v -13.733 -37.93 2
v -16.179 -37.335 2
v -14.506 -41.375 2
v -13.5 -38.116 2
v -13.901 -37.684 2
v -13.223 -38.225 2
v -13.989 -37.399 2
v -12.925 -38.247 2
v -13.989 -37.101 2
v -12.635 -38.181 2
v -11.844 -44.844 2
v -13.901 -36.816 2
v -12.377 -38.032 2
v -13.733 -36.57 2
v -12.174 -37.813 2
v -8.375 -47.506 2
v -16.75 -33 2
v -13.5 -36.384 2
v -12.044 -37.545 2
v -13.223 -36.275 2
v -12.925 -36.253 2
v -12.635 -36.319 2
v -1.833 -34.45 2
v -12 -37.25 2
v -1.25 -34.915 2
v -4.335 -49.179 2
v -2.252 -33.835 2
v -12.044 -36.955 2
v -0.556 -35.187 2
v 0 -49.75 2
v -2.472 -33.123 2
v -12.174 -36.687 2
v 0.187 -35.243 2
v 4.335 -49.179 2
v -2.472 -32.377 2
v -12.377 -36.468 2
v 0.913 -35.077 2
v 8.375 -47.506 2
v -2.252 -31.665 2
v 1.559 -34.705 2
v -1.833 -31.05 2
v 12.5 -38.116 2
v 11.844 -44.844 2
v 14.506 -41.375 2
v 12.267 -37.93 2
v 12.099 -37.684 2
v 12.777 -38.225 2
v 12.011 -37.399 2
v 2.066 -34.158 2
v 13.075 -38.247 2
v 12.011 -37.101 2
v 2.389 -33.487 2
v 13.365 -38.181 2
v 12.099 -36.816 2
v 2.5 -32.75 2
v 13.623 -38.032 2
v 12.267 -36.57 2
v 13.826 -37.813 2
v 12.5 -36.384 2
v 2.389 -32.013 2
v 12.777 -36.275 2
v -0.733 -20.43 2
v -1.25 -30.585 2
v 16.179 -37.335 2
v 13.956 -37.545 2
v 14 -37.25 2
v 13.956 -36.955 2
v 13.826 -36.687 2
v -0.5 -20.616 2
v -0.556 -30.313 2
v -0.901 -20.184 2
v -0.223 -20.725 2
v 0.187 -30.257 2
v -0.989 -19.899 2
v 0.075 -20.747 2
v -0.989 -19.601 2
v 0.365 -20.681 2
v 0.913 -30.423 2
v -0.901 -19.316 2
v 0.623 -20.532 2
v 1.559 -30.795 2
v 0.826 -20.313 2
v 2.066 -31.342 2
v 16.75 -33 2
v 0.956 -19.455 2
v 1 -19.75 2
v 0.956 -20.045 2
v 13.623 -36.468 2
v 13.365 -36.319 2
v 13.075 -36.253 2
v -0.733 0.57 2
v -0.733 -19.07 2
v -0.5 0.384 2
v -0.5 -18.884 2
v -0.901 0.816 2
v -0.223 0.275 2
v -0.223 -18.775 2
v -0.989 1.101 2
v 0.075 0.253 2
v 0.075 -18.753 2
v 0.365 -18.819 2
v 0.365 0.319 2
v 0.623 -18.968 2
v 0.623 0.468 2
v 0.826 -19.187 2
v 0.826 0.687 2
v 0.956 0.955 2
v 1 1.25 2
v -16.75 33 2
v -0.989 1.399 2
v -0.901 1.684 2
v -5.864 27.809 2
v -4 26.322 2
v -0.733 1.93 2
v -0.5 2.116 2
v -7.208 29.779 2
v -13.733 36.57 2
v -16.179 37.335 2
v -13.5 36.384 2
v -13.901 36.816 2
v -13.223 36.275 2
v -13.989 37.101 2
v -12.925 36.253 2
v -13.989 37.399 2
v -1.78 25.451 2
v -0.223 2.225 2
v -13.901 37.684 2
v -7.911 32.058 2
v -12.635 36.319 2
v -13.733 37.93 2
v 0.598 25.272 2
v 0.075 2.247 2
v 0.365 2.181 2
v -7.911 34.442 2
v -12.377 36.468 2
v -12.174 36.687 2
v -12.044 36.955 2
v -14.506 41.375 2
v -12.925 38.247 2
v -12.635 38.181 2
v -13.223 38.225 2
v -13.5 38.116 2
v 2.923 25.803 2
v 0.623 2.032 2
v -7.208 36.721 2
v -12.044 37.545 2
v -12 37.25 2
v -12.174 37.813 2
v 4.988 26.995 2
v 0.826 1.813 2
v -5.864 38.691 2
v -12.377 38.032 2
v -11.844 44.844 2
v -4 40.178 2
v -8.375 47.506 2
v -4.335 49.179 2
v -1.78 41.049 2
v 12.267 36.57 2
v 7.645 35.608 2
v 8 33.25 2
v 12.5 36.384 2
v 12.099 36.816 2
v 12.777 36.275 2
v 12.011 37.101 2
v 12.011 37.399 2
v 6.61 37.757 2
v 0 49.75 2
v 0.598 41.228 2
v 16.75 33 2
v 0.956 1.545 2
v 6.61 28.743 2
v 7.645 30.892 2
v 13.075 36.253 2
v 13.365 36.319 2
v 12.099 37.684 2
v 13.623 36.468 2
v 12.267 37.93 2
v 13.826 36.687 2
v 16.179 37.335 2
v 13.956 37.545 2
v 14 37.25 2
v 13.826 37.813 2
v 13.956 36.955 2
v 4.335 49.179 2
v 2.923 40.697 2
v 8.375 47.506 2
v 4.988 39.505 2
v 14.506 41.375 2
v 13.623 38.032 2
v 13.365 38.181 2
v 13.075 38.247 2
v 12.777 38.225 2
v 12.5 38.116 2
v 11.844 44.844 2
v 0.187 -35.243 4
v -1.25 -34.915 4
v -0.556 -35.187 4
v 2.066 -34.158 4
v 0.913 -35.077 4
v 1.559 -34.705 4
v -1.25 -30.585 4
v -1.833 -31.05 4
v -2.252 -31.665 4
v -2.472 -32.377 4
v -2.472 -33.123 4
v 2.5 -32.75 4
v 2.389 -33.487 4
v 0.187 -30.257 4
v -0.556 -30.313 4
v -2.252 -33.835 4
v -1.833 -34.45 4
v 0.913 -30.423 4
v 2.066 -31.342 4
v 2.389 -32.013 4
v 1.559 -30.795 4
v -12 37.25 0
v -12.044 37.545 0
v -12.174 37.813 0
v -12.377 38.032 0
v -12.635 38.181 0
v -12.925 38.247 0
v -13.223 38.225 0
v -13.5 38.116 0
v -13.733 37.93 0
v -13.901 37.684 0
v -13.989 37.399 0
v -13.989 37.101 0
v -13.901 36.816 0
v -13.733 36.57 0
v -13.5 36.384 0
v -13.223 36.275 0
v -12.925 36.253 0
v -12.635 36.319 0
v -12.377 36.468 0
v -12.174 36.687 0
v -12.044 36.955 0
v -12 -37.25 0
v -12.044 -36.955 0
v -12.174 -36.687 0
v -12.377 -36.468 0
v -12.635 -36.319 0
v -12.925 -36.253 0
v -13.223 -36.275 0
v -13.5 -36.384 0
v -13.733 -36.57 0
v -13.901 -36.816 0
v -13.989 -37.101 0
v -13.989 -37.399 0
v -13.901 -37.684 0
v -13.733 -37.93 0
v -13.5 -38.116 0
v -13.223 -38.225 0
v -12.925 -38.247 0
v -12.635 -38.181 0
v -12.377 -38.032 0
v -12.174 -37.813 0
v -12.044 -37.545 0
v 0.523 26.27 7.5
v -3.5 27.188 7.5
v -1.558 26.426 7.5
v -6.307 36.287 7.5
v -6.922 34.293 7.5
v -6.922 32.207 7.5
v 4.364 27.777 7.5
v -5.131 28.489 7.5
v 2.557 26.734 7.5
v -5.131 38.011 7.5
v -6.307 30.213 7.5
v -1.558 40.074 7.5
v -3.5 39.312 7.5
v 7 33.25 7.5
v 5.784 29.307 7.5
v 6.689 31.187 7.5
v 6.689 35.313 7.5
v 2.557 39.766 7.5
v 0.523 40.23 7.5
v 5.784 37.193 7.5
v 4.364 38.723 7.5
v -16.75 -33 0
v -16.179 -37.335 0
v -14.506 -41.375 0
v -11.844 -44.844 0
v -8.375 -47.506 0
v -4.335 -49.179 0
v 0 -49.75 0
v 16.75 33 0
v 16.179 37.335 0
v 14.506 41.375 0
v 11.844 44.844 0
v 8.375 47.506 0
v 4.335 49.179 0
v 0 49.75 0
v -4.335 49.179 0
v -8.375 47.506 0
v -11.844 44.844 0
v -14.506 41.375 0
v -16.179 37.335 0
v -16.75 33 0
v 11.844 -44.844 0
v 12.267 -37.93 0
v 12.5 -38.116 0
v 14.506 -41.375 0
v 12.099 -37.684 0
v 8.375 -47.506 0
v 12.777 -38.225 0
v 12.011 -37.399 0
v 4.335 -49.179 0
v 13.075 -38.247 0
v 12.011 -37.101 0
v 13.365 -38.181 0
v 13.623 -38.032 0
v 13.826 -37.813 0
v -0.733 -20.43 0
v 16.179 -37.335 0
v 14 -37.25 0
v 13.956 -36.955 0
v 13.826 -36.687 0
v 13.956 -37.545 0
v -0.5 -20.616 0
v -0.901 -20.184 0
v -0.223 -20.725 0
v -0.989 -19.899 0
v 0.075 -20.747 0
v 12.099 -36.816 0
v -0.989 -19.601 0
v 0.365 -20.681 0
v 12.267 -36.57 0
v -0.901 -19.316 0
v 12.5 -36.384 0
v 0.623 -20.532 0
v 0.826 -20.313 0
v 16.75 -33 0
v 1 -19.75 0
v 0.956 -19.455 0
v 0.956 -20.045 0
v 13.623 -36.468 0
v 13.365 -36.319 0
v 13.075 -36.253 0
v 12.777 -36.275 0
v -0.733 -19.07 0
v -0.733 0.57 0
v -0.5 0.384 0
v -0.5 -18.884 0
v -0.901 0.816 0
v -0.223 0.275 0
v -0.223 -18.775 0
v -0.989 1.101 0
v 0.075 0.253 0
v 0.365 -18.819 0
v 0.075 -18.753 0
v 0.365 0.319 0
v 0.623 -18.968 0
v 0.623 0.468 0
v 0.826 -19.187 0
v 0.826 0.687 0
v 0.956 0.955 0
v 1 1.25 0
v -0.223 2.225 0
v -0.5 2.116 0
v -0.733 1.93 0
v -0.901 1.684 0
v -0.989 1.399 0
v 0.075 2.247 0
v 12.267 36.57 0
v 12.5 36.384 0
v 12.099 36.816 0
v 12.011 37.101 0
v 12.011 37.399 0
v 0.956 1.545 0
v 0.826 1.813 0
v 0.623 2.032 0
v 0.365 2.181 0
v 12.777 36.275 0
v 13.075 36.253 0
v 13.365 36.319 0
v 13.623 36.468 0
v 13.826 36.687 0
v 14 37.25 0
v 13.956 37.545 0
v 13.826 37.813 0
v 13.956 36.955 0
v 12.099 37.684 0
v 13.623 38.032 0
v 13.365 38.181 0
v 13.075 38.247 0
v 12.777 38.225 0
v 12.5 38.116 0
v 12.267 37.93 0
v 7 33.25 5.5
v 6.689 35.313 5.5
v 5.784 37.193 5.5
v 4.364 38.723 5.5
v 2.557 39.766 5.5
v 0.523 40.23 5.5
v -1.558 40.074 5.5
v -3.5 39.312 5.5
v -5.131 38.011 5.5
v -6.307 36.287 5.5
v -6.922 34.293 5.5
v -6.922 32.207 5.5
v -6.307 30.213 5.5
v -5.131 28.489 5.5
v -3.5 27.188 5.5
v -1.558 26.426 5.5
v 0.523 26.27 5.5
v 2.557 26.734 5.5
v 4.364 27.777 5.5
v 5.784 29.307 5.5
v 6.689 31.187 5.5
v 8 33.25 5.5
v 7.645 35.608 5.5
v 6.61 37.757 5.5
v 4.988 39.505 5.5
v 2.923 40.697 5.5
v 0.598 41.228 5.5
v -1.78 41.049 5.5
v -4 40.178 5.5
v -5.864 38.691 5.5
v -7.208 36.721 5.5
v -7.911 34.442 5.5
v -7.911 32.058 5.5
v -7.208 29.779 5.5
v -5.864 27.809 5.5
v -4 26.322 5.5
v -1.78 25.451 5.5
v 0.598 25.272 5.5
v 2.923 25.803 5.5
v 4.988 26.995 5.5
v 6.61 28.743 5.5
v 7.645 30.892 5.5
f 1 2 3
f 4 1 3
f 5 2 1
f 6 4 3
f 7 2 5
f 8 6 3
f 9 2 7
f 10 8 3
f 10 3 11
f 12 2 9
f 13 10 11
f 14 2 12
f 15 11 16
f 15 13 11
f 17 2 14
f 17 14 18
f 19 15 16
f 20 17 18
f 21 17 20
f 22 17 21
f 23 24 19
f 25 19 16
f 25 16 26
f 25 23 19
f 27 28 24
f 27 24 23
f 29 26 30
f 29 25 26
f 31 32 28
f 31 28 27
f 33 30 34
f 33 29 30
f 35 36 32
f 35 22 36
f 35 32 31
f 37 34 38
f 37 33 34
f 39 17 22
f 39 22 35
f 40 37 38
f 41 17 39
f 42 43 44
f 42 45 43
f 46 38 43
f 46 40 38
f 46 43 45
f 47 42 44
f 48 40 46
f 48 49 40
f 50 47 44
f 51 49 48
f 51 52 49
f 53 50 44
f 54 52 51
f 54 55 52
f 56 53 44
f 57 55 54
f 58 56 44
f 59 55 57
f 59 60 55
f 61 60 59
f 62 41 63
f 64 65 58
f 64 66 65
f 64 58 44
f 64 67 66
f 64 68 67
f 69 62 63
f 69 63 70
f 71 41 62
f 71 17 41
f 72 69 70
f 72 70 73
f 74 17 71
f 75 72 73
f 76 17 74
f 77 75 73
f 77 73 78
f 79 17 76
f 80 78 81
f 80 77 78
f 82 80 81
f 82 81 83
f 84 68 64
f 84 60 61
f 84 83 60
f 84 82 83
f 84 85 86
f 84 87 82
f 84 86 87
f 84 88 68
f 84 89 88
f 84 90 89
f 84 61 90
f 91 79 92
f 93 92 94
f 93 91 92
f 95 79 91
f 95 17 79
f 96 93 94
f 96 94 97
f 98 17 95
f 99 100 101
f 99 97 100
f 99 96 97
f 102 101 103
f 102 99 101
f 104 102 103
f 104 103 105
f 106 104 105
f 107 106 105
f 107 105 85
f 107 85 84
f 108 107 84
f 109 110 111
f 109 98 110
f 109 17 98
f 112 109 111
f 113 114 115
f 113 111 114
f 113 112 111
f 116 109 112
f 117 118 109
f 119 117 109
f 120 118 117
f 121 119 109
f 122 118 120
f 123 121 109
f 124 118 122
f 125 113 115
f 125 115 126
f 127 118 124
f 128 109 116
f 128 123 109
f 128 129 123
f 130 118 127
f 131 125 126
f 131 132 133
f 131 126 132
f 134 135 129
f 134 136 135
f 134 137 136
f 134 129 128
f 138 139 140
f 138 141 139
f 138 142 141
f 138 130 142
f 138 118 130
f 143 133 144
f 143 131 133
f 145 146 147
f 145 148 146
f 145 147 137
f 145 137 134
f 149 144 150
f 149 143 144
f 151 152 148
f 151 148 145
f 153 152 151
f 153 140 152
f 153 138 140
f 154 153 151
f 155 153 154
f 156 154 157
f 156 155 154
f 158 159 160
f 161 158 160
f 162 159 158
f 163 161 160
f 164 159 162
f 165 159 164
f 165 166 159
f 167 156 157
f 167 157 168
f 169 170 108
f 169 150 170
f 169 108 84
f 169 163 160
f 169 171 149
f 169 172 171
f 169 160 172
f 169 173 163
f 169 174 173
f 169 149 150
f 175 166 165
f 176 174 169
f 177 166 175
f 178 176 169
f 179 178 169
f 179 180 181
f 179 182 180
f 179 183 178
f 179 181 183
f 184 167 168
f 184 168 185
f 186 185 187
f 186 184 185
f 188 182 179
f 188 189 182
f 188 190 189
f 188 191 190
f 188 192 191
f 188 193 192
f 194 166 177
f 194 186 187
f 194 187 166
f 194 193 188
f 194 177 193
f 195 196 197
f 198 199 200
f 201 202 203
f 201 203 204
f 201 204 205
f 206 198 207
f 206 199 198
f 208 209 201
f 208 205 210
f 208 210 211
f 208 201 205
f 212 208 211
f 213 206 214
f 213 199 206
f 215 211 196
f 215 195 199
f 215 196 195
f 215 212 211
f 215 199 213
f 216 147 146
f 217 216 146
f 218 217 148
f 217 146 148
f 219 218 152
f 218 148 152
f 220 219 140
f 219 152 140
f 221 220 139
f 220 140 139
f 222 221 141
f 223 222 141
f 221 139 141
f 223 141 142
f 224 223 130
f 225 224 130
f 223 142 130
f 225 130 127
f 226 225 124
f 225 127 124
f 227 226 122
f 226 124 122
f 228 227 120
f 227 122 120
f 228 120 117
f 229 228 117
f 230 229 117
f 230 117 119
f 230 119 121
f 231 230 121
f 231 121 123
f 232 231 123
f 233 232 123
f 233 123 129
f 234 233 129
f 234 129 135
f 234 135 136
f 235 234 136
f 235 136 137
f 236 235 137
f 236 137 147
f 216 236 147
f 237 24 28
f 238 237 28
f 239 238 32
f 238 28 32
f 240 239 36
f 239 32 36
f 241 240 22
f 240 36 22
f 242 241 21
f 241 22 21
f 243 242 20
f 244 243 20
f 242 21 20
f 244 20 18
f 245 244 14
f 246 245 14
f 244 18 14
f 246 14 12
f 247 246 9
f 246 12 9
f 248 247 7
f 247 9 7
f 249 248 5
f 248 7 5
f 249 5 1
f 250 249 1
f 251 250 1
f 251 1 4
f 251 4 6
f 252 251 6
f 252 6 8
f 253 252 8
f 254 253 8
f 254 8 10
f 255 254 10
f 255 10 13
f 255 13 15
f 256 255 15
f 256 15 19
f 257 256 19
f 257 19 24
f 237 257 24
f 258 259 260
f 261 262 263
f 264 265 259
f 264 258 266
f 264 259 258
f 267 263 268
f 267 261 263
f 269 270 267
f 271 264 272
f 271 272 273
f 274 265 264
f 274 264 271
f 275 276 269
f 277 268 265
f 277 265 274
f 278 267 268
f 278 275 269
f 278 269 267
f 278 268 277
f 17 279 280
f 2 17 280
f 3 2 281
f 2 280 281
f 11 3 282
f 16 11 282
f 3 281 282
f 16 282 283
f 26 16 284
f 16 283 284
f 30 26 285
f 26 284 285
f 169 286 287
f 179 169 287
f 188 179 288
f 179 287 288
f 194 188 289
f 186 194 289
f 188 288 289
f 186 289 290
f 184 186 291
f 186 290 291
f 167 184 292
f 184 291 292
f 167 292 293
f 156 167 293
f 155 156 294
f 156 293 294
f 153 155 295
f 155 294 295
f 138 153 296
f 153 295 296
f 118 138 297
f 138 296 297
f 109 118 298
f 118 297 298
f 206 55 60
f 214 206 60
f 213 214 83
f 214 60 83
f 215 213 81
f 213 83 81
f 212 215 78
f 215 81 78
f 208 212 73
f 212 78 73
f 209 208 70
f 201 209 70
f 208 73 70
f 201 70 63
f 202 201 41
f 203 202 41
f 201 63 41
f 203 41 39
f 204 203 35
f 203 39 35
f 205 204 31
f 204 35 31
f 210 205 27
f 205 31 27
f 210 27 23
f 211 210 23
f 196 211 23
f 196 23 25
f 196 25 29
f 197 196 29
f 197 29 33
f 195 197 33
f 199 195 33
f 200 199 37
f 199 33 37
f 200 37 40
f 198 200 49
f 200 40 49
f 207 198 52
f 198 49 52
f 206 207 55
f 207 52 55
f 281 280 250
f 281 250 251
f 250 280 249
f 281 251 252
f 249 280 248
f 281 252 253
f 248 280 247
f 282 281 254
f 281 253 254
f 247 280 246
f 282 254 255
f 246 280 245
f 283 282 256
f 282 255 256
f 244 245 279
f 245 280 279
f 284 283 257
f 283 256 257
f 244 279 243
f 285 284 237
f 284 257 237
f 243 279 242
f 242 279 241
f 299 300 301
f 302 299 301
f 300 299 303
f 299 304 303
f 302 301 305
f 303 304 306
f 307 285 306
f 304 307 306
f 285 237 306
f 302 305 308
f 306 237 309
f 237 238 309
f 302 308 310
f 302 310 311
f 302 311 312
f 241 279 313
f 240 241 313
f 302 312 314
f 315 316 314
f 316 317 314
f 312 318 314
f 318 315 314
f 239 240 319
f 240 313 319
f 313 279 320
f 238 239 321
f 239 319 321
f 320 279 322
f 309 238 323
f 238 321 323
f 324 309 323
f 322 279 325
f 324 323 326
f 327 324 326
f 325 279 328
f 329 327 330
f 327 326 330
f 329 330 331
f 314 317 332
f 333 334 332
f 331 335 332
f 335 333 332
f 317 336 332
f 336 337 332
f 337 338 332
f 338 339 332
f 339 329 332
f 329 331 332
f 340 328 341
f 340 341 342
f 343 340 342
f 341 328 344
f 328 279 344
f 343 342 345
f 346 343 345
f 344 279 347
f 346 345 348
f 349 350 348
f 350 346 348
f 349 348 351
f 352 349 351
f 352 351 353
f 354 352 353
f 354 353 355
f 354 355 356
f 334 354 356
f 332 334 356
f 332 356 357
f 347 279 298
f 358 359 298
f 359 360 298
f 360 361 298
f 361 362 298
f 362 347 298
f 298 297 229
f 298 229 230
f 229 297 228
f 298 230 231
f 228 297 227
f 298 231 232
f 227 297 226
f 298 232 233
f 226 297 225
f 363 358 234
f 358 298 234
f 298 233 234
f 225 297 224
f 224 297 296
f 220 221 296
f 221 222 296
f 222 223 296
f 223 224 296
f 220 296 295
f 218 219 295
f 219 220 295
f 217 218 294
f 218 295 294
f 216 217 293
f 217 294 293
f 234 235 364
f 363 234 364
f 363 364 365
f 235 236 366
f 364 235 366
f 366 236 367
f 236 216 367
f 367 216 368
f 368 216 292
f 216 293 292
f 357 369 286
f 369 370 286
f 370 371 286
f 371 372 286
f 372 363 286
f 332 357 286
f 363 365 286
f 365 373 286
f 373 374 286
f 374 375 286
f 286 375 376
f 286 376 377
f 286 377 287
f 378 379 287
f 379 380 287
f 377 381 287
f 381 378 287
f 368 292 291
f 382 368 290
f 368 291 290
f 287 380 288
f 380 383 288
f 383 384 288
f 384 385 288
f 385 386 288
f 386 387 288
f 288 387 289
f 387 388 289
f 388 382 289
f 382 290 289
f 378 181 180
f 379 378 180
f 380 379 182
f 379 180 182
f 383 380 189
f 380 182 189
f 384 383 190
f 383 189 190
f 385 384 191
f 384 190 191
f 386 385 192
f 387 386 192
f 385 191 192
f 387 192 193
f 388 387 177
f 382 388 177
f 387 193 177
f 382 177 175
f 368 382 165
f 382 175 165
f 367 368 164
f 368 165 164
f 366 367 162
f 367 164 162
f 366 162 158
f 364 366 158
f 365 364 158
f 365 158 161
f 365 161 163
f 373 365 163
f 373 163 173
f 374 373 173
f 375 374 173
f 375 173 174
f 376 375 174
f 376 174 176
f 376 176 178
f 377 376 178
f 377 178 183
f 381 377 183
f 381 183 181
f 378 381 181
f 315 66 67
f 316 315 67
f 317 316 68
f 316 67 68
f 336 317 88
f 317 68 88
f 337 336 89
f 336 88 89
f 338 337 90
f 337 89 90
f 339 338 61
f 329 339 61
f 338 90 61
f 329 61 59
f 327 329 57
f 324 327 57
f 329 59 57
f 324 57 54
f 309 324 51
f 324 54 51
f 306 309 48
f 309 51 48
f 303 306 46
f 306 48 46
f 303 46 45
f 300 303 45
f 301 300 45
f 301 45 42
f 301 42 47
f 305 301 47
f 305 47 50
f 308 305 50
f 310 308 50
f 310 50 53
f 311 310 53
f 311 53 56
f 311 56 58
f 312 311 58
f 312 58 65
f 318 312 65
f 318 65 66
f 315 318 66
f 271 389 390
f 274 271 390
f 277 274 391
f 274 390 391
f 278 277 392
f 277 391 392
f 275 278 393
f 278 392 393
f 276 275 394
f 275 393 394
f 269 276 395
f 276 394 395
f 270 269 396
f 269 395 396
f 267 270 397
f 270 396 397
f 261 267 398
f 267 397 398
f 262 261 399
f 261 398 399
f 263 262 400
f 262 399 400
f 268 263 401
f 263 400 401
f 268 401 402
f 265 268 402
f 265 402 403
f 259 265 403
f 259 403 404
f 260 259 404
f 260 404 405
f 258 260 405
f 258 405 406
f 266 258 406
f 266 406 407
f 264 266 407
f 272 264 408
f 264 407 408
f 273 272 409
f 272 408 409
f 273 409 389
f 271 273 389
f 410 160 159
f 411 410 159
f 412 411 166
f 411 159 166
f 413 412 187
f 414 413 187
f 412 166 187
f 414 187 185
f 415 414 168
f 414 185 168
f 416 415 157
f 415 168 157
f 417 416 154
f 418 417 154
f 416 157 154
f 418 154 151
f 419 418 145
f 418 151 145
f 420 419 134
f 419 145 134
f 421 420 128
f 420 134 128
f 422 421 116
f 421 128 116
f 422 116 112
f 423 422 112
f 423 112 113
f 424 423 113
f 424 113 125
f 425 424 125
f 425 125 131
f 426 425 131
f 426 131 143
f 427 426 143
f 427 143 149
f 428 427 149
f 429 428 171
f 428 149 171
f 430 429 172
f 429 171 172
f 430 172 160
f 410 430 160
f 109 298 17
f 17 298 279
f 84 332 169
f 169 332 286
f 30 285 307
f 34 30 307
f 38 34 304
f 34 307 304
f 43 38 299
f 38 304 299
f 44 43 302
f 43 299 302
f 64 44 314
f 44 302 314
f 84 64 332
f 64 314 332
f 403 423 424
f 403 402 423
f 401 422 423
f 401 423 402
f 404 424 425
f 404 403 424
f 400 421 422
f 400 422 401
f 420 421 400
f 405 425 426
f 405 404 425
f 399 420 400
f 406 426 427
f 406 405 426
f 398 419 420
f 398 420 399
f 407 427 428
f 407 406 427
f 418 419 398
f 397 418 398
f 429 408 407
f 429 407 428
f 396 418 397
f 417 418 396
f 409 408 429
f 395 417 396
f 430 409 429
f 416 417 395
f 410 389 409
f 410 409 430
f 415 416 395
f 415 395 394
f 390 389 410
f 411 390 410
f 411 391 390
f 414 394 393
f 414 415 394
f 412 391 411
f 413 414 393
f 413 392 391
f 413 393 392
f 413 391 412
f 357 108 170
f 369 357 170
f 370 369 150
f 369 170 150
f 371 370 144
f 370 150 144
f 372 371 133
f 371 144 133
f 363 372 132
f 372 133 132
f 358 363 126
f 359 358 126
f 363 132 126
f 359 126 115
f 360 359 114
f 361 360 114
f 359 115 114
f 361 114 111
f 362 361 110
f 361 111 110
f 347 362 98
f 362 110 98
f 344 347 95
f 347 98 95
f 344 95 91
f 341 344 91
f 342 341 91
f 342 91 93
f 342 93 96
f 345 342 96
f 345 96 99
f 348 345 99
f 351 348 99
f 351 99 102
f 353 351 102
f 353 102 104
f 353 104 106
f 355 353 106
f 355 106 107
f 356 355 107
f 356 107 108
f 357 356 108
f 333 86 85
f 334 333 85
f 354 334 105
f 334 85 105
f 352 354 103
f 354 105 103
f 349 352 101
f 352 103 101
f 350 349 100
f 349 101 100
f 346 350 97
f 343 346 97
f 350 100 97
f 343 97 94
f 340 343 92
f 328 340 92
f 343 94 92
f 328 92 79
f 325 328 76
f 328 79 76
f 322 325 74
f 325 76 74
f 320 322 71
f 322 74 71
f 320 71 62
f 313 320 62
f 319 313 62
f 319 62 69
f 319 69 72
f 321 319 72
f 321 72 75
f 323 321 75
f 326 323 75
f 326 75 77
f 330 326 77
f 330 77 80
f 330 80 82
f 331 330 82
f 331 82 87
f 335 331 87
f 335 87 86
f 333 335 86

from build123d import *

# Parameters (mm, degrees)
F1_DEPTH = 2
F2_R     = 1
F3_DEPTH = 2.001
F4_R     = 8
F5_DEPTH = 3.5
F6_R     = 7
F7_DEPTH = 2
F8_R     = 2.5
F9_DEPTH = 2


with BuildPart() as f1:
    # F0 (on Top) → F1 (new body)
    with BuildSketch(Plane.XY):
        with BuildLine():
            Line((16.75, -33), (16.75, 33))
            ThreePointArc((16.75, 33), (11.844039, 44.844039), (0, 49.75))
            ThreePointArc((0, 49.75), (-11.844039, 44.844039), (-16.75, 33))
            Line((-16.75, 33), (-16.75, -33))
            ThreePointArc((-16.75, -33), (-11.844039, -44.844039), (0, -49.75))
            ThreePointArc((0, -49.75), (11.844039, -44.844039), (16.75, -33))
        make_face()
    extrude(amount=F1_DEPTH)

    # F2 (on face) → F3 (cut, through all)
    with BuildSketch(Plane.XY.offset(2)):
        with Locations((-13, -37.25)):
            Circle(F2_R)
        with Locations((13, -37.25)):
            Circle(F2_R)
        with Locations((0, 1.25)):
            Circle(F2_R)
        with Locations((0, -19.75)):
            Circle(F2_R)
        with Locations((13, 37.25)):
            Circle(F2_R)
        with Locations((-13, 37.25)):
            Circle(F2_R)
    extrude(amount=-F3_DEPTH, mode=Mode.SUBTRACT)

    # F4 (on face) → F5 (join)
    with BuildSketch(Plane.XY.offset(2)):
        with Locations((0, 33.25)):
            Circle(F4_R)
    extrude(amount=F5_DEPTH)

    # F6 (on face) → F7 (join)
    with BuildSketch(Plane.XY.offset(5.5)):
        with Locations((0, 33.25)):
            Circle(F6_R)
    extrude(amount=F7_DEPTH)

    # F8 (on face) → F9 (join)
    with BuildSketch(Plane.XY.offset(2)):
        with Locations((0, -32.75)):
            Circle(F8_R)
    extrude(amount=F9_DEPTH)


solid = f1.part
